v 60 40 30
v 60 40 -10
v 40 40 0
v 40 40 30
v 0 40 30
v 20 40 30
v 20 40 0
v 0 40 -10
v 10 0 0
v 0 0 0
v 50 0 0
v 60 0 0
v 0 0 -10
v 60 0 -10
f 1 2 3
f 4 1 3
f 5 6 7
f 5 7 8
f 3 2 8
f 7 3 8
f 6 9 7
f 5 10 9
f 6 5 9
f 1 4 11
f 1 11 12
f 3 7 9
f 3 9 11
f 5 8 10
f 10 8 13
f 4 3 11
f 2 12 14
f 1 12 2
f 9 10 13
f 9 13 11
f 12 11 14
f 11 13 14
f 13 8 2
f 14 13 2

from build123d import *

# Parameters (mm, degrees)
F1_DEPTH   = 10
F2_DEPTH   = 30
F3_SIZE2   = 29.99999
F3_SIZE    = 39.99999
F3_2_SIZE2 = 29.99999
F3_2_SIZE  = 39.99999


# Not quite as in the source:
# - a fillet or chamfer is up to 0.001 mm smaller than in the source, because OpenCascade refuses the exact size


with BuildPart() as f1:
    # F0 (on Top) → F1 (new body)
    with BuildSketch(Plane.XY):
        Polygon((0, 40), (0, 0), (10, 0), (20, 40), align=None)
        Polygon((20, 40), (10, 0), (50, 0), (40, 40), align=None)
        Polygon((40, 40), (50, 0), (60, 0), (60, 40), align=None)
    extrude(amount=-F1_DEPTH)

    # F0 (on Top) → F2 (join)
    with BuildSketch(Plane.XY):
        Polygon((0, 40), (0, 0), (10, 0), (20, 40), align=None)
        Polygon((40, 40), (50, 0), (60, 0), (60, 40), align=None)
    extrude(amount=F2_DEPTH)

    # F3 (size 40 and 30 in the source; OpenCascade refuses exactly that, so slightly less here)
    f3_edges = [f1.edges().sort_by_distance(p)[0] for p in [
        (5, 0, 30),
    ]]
    f3_side = f1.faces().sort_by_distance((7.777778, 22.222222, 30))[0]
    chamfer(f3_edges, length=F3_SIZE, length2=F3_SIZE2, reference=f3_side)

    # F3#2 (size 40 and 30 in the source; OpenCascade refuses exactly that, so slightly less here)
    f3_2_edges = [f1.edges().sort_by_distance(p)[0] for p in [
        (55, 0, 30),
    ]]
    f3_2_side = f1.faces().sort_by_distance((52.222222, 22.222222, 30))[0]
    chamfer(f3_2_edges, length=F3_2_SIZE, length2=F3_2_SIZE2, reference=f3_2_side)


solid = f1.part
